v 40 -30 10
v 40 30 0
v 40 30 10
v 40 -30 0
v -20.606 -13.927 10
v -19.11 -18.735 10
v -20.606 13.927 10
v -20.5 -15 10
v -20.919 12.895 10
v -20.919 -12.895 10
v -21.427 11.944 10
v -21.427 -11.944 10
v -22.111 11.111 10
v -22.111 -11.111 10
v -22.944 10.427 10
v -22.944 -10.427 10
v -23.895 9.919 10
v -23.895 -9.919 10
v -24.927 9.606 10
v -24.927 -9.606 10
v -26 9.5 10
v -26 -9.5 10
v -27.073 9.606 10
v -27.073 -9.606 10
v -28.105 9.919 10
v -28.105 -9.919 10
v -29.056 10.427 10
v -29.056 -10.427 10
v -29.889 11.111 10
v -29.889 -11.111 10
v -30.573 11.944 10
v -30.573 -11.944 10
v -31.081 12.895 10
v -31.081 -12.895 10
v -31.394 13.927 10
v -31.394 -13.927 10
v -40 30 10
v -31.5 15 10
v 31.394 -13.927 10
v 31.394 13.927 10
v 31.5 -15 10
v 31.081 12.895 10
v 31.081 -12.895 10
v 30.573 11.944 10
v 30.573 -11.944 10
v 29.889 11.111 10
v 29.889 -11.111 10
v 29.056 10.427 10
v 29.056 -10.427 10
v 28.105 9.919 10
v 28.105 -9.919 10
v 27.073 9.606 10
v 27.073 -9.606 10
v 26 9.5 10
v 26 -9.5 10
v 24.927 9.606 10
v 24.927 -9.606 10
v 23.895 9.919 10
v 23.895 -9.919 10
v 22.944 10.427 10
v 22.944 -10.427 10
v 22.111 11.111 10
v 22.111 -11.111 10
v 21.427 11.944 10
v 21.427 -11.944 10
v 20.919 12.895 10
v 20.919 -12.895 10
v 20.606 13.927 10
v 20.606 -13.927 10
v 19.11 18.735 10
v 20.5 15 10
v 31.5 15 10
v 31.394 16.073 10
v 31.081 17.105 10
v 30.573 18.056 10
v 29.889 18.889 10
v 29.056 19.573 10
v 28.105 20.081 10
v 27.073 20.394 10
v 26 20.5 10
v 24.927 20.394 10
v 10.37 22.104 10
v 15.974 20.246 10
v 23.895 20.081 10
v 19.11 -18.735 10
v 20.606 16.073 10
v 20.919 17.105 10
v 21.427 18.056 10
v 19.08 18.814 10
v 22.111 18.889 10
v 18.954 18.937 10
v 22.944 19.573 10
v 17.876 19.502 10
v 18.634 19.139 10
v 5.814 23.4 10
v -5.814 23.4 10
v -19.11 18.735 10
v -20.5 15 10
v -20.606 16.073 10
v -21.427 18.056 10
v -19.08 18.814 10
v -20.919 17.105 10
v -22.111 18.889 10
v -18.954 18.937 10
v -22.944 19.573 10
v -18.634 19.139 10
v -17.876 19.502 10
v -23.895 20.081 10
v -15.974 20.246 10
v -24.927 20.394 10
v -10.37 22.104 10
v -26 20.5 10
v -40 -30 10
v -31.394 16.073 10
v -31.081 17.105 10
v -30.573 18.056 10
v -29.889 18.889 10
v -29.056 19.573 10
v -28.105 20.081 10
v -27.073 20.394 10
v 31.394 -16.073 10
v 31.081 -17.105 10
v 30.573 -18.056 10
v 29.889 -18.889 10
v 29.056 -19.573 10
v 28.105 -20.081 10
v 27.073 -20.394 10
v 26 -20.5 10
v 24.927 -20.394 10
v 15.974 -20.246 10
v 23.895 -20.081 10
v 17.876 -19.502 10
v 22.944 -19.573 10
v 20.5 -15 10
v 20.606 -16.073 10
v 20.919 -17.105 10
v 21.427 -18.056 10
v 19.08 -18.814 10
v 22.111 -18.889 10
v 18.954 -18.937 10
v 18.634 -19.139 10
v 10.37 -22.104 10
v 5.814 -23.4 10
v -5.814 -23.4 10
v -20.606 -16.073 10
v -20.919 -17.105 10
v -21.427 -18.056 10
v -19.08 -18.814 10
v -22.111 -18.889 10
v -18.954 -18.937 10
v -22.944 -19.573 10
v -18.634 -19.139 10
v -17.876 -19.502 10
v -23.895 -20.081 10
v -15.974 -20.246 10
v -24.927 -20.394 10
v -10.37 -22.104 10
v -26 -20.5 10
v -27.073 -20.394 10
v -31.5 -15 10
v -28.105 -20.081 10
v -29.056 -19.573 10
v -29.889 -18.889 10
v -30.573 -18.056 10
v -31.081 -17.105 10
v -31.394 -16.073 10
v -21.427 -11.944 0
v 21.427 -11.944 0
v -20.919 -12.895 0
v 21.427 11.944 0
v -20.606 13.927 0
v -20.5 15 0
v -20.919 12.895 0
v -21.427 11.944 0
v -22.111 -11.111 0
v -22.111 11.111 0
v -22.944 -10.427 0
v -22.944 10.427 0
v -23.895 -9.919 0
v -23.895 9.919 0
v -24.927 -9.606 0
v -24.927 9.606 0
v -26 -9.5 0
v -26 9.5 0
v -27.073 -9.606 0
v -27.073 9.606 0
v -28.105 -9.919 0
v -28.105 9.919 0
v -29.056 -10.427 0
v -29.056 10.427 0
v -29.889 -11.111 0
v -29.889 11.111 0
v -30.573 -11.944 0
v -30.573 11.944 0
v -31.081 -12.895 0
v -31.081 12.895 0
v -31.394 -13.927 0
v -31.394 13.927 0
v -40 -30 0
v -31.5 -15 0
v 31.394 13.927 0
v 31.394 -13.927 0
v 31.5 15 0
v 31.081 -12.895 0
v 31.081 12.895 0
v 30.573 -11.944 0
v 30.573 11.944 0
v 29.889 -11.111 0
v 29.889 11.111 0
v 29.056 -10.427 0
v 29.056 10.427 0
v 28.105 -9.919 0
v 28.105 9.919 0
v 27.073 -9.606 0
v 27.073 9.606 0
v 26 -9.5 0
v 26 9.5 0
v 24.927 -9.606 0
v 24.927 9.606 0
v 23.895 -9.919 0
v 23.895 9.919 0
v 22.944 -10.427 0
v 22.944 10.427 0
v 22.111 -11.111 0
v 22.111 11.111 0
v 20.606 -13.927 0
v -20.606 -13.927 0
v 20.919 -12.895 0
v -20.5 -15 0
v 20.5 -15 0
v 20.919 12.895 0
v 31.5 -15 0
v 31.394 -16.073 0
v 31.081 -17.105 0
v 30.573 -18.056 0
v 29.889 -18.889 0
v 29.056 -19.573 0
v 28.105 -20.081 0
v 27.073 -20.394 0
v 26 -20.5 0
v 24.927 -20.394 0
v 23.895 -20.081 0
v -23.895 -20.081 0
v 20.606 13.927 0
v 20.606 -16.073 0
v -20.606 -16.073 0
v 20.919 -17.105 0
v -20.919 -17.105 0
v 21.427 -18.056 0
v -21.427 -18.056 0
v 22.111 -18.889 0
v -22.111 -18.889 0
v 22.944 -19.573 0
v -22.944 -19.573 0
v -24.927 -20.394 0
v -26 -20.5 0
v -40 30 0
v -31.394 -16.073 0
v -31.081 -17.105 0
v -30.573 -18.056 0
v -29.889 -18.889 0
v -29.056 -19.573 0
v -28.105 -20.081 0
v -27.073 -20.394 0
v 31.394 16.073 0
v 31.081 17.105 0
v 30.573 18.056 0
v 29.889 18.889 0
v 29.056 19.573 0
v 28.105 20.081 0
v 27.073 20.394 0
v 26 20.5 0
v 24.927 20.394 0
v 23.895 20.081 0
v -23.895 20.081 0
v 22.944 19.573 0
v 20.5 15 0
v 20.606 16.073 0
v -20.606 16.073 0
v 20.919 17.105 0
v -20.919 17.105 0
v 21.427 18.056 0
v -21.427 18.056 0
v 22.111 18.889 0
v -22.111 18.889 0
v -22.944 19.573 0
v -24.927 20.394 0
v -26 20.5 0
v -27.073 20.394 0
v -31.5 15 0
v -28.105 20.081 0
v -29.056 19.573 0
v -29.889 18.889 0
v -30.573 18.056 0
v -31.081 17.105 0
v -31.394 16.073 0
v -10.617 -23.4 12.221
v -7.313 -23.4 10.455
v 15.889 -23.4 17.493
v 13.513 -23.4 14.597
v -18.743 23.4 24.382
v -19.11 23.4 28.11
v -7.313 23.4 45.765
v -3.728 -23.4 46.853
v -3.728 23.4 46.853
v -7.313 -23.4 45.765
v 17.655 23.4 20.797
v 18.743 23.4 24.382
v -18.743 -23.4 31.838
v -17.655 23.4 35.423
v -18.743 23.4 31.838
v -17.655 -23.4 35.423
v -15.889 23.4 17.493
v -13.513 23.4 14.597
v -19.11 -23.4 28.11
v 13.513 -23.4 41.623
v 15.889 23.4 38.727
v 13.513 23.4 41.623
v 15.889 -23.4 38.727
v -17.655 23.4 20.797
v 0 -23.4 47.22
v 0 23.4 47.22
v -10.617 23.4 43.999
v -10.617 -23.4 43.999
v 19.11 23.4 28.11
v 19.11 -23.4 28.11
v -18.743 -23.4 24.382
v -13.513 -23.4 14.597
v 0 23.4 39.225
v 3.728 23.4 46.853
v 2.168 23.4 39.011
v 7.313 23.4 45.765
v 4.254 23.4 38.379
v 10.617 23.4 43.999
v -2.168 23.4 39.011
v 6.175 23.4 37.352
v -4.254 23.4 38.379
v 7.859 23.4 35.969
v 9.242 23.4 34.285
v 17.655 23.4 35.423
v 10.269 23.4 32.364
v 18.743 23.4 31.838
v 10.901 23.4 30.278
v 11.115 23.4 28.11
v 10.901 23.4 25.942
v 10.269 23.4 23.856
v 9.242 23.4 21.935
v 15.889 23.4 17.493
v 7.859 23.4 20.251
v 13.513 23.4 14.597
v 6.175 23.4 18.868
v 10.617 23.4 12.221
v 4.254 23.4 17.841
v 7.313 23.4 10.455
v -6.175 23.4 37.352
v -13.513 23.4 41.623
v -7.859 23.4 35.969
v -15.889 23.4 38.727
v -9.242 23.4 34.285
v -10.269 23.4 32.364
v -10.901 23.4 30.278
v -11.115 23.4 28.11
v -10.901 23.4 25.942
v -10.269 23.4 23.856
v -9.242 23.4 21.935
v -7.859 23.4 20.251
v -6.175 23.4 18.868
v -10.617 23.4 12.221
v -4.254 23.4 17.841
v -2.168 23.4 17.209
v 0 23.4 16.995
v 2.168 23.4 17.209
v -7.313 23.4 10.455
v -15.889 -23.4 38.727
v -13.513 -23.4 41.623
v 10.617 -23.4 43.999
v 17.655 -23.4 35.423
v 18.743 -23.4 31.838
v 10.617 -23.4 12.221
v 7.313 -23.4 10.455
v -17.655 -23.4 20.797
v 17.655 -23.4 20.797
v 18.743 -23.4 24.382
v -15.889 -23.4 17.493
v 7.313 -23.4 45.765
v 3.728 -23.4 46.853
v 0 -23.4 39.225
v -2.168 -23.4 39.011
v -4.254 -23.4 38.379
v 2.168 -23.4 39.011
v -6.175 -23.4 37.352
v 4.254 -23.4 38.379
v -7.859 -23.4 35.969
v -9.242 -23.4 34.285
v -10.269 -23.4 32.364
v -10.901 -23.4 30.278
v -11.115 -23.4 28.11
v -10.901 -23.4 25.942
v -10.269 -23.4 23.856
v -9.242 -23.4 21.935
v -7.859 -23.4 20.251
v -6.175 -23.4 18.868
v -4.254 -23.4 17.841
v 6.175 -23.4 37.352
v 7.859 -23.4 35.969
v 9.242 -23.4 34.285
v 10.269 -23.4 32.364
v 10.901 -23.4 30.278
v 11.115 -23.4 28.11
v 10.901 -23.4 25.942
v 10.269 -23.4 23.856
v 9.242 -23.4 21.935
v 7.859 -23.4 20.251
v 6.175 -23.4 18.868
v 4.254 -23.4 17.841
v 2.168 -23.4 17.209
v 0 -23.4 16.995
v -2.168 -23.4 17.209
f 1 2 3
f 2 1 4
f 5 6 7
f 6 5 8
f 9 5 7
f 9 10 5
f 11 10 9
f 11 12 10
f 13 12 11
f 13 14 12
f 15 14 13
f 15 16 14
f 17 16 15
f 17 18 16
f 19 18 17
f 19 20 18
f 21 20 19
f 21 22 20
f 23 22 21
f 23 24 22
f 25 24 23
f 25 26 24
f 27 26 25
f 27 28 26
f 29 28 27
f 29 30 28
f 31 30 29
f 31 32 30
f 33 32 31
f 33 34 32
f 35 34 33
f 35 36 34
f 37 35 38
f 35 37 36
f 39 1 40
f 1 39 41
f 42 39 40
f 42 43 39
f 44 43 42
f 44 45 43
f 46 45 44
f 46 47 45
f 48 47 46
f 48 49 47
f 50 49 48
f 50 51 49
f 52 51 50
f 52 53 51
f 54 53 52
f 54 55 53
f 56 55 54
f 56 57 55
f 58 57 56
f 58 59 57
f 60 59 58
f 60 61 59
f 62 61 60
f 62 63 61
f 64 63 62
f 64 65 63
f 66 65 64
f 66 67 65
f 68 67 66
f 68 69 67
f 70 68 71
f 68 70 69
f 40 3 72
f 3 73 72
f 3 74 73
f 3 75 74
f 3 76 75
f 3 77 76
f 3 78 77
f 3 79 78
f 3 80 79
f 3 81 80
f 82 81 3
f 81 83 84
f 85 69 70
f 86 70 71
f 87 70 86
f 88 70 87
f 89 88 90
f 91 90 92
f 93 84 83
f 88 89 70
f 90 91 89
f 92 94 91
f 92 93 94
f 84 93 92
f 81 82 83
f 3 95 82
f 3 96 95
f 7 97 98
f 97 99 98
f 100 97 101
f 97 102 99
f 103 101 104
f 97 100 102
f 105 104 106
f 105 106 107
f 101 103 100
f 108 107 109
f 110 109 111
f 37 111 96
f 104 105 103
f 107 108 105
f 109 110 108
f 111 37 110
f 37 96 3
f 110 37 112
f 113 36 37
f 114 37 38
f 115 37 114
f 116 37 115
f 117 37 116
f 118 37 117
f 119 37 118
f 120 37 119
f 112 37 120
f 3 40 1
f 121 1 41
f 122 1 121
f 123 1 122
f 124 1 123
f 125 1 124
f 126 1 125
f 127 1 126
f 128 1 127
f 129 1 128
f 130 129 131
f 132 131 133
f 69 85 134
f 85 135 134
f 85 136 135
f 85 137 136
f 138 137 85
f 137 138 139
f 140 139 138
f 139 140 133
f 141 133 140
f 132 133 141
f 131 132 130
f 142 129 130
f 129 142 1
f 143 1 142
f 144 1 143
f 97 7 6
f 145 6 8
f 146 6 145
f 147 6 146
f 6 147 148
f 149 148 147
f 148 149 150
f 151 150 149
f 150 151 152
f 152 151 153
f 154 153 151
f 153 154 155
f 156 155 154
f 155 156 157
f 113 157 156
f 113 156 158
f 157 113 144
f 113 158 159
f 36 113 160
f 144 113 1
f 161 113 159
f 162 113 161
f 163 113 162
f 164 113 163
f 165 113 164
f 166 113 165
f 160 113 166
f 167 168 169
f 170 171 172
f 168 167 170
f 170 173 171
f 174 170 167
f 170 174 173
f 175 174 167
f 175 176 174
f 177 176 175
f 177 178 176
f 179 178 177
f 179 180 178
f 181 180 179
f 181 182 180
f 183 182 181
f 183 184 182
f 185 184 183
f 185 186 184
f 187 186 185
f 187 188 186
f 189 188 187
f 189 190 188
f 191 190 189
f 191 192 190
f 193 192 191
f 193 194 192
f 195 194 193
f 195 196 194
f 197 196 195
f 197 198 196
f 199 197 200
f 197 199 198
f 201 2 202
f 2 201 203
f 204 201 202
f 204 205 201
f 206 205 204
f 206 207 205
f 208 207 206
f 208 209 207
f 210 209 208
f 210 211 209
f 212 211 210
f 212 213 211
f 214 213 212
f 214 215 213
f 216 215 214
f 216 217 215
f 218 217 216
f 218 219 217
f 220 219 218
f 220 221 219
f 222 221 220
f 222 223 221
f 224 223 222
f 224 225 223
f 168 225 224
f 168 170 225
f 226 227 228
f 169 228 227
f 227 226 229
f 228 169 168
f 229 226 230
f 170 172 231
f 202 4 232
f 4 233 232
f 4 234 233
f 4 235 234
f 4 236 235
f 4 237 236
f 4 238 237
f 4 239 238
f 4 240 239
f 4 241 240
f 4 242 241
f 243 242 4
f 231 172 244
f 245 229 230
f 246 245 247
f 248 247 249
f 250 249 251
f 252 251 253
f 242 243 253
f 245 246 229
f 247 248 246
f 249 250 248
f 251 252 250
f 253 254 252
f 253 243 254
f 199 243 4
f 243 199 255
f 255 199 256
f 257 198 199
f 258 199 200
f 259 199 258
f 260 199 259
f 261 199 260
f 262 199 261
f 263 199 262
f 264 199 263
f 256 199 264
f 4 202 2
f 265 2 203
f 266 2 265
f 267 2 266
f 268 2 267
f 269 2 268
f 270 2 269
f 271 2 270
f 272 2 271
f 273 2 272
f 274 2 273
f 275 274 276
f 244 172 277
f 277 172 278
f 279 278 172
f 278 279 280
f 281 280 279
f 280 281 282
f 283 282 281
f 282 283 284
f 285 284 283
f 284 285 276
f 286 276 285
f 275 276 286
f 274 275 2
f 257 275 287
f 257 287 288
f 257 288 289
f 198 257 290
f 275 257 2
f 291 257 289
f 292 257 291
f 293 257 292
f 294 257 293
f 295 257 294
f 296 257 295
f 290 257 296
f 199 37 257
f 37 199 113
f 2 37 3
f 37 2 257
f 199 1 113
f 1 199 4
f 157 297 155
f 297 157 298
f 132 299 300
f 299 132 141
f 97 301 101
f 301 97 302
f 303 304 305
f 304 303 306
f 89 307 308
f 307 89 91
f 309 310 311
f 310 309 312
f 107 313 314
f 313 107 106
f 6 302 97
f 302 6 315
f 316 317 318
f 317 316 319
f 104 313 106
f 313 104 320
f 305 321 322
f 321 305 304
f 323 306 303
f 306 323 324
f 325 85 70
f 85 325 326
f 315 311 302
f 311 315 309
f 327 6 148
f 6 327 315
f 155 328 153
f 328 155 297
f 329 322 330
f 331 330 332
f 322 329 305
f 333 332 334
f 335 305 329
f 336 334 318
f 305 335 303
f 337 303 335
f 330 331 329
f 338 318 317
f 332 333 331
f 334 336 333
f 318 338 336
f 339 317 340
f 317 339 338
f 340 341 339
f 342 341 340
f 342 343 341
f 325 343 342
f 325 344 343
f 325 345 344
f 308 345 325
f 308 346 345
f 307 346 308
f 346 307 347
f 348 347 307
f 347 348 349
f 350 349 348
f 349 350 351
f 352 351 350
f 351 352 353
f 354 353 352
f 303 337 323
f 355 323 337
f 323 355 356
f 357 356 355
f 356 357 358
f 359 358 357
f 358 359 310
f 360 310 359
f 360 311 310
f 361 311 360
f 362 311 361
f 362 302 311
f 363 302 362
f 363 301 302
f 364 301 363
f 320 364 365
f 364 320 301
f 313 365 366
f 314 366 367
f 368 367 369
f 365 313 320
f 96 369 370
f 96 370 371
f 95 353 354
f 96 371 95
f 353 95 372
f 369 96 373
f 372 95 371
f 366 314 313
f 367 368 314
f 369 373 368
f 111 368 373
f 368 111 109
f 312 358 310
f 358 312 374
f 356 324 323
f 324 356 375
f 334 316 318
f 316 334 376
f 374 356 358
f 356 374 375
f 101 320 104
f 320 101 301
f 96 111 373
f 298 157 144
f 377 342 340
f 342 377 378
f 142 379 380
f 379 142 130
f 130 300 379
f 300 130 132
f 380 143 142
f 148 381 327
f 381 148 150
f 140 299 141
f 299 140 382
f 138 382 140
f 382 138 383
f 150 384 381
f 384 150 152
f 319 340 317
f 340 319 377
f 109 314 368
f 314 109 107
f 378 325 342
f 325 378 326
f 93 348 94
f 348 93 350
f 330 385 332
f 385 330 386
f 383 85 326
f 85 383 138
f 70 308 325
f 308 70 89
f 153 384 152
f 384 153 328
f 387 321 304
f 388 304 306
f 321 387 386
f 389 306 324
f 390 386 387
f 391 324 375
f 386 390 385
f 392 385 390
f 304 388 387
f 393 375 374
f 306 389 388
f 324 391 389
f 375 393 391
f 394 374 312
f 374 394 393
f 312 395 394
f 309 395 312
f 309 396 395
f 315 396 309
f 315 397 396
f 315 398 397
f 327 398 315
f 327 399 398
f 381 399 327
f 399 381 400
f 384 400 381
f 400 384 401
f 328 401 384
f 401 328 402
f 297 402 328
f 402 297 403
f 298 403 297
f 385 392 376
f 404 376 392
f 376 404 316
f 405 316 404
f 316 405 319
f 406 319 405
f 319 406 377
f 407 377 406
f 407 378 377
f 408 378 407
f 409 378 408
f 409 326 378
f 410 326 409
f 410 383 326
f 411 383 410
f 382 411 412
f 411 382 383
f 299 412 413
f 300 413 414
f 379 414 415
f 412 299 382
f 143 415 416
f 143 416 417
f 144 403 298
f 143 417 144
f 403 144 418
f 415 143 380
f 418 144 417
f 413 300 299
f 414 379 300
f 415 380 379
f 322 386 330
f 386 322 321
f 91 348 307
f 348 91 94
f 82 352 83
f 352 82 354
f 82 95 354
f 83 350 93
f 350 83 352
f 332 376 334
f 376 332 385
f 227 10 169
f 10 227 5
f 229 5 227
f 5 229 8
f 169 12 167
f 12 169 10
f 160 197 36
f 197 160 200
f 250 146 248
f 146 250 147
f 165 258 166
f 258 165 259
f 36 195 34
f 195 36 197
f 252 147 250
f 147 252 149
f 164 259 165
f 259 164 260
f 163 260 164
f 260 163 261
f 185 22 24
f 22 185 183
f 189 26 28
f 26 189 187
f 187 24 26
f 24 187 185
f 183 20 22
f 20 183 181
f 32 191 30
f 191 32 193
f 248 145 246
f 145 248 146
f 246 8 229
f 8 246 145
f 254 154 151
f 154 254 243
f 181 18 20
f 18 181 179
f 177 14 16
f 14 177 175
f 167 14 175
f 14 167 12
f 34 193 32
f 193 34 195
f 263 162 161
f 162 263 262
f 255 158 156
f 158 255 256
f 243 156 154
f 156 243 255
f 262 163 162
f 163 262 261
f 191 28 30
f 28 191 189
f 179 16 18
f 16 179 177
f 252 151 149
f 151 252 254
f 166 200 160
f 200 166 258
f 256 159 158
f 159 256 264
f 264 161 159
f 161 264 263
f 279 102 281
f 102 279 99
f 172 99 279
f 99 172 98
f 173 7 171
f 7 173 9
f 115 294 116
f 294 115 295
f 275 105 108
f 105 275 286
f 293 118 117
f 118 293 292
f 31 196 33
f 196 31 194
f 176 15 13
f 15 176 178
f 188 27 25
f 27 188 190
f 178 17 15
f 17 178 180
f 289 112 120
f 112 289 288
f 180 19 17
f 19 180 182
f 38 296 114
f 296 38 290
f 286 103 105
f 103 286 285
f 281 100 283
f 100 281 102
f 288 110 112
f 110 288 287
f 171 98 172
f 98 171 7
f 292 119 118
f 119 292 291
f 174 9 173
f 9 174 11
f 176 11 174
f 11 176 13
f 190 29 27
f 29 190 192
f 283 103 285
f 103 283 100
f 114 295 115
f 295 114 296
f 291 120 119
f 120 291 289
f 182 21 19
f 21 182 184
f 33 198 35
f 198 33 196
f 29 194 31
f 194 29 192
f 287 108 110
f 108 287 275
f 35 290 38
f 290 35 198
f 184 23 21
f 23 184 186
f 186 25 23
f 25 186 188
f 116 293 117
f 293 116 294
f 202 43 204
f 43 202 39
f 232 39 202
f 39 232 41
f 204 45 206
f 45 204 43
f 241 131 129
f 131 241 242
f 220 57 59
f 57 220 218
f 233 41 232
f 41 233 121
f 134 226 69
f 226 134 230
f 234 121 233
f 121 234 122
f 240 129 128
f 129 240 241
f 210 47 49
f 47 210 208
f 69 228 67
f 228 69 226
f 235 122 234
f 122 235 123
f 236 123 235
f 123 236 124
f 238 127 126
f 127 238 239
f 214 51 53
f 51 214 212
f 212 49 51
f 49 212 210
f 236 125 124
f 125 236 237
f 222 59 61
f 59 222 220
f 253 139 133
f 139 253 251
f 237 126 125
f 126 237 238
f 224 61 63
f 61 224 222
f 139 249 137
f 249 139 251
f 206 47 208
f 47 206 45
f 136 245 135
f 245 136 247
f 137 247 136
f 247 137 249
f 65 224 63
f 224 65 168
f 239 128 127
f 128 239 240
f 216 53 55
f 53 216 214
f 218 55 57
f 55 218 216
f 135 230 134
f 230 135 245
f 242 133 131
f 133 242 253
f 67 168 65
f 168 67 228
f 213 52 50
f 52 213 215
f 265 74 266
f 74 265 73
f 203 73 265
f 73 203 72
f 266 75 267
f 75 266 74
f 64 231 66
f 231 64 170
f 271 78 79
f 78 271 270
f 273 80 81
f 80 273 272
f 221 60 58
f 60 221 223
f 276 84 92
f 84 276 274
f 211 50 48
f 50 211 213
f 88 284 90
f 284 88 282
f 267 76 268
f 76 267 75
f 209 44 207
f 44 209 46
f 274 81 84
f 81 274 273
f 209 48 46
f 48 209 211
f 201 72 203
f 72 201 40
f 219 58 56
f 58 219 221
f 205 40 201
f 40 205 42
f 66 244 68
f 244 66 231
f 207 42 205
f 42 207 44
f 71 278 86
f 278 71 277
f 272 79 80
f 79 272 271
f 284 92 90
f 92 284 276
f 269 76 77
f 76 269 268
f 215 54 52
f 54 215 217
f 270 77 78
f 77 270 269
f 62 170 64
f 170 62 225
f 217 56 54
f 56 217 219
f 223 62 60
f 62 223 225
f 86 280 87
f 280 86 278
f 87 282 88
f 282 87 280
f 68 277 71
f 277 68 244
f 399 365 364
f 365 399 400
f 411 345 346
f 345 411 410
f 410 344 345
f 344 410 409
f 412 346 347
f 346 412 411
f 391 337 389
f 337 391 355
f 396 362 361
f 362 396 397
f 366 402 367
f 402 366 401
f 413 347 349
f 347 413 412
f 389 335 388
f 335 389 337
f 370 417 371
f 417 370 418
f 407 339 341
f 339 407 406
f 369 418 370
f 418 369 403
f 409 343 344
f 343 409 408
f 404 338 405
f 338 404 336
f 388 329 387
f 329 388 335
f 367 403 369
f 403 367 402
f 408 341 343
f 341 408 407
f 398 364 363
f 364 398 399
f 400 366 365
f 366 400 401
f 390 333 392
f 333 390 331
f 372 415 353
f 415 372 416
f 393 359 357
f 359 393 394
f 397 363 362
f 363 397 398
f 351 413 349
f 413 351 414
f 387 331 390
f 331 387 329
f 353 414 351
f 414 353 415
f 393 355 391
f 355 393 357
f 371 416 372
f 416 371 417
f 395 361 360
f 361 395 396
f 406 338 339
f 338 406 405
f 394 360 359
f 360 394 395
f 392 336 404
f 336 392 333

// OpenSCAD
$fn = 32;

// ----------------------------------------------------------------------
// Bearing block: 80 x 60 mm base, 22.23 mm bore at 28.11 mm
// ----------------------------------------------------------------------

// --- parameters (mm) ---
base_w = 80;              // base width
base_d = 60;              // base depth
base_t = 10;              // base thickness
bore_d = 22.23;           // shaft / bearing bore
house_r = 19.11;          // housing outer radius
house_len = 46.8;         // housing length along the shaft
foot_w = 38.22;           // foot width under the housing
foot_len = 36.8;          // foot length along the shaft
axis_z = 28.11;           // bore axis height above the base
holes_d = 11;             // mounting holes
hole_x = 26;              // mounting hole spacing

difference() {
  union() {
    /* base plate with its underside on z = 0 */
    translate([0, 0, base_t / 2]) cube([base_w, base_d, base_t], center = true);
    /* hull foot: a straight web blending into the round housing */
    hull() {
      translate([0, 0, base_t - 0.5]) cube([foot_w, foot_len, 1.6], center = true);
      translate([0, 0, axis_z]) rotate([-90, 0, 0]) cylinder(h = house_len, d = 2 * house_r, center = true);
    }
  }
  /* bore through the housing, 2.5 mm clear on both sides */
  translate([0, 0, axis_z]) rotate([-90, 0, 0]) cylinder(h = house_len + 5, d = bore_d, center = true);
  /* mounting holes through the base plate */
  for (hx = [-26, 26]) {
    for (hy = [-15, 15]) {
      translate([hx, hy, -2.5]) cylinder(h = base_t + 5, d = holes_d);
    }
  }
}
